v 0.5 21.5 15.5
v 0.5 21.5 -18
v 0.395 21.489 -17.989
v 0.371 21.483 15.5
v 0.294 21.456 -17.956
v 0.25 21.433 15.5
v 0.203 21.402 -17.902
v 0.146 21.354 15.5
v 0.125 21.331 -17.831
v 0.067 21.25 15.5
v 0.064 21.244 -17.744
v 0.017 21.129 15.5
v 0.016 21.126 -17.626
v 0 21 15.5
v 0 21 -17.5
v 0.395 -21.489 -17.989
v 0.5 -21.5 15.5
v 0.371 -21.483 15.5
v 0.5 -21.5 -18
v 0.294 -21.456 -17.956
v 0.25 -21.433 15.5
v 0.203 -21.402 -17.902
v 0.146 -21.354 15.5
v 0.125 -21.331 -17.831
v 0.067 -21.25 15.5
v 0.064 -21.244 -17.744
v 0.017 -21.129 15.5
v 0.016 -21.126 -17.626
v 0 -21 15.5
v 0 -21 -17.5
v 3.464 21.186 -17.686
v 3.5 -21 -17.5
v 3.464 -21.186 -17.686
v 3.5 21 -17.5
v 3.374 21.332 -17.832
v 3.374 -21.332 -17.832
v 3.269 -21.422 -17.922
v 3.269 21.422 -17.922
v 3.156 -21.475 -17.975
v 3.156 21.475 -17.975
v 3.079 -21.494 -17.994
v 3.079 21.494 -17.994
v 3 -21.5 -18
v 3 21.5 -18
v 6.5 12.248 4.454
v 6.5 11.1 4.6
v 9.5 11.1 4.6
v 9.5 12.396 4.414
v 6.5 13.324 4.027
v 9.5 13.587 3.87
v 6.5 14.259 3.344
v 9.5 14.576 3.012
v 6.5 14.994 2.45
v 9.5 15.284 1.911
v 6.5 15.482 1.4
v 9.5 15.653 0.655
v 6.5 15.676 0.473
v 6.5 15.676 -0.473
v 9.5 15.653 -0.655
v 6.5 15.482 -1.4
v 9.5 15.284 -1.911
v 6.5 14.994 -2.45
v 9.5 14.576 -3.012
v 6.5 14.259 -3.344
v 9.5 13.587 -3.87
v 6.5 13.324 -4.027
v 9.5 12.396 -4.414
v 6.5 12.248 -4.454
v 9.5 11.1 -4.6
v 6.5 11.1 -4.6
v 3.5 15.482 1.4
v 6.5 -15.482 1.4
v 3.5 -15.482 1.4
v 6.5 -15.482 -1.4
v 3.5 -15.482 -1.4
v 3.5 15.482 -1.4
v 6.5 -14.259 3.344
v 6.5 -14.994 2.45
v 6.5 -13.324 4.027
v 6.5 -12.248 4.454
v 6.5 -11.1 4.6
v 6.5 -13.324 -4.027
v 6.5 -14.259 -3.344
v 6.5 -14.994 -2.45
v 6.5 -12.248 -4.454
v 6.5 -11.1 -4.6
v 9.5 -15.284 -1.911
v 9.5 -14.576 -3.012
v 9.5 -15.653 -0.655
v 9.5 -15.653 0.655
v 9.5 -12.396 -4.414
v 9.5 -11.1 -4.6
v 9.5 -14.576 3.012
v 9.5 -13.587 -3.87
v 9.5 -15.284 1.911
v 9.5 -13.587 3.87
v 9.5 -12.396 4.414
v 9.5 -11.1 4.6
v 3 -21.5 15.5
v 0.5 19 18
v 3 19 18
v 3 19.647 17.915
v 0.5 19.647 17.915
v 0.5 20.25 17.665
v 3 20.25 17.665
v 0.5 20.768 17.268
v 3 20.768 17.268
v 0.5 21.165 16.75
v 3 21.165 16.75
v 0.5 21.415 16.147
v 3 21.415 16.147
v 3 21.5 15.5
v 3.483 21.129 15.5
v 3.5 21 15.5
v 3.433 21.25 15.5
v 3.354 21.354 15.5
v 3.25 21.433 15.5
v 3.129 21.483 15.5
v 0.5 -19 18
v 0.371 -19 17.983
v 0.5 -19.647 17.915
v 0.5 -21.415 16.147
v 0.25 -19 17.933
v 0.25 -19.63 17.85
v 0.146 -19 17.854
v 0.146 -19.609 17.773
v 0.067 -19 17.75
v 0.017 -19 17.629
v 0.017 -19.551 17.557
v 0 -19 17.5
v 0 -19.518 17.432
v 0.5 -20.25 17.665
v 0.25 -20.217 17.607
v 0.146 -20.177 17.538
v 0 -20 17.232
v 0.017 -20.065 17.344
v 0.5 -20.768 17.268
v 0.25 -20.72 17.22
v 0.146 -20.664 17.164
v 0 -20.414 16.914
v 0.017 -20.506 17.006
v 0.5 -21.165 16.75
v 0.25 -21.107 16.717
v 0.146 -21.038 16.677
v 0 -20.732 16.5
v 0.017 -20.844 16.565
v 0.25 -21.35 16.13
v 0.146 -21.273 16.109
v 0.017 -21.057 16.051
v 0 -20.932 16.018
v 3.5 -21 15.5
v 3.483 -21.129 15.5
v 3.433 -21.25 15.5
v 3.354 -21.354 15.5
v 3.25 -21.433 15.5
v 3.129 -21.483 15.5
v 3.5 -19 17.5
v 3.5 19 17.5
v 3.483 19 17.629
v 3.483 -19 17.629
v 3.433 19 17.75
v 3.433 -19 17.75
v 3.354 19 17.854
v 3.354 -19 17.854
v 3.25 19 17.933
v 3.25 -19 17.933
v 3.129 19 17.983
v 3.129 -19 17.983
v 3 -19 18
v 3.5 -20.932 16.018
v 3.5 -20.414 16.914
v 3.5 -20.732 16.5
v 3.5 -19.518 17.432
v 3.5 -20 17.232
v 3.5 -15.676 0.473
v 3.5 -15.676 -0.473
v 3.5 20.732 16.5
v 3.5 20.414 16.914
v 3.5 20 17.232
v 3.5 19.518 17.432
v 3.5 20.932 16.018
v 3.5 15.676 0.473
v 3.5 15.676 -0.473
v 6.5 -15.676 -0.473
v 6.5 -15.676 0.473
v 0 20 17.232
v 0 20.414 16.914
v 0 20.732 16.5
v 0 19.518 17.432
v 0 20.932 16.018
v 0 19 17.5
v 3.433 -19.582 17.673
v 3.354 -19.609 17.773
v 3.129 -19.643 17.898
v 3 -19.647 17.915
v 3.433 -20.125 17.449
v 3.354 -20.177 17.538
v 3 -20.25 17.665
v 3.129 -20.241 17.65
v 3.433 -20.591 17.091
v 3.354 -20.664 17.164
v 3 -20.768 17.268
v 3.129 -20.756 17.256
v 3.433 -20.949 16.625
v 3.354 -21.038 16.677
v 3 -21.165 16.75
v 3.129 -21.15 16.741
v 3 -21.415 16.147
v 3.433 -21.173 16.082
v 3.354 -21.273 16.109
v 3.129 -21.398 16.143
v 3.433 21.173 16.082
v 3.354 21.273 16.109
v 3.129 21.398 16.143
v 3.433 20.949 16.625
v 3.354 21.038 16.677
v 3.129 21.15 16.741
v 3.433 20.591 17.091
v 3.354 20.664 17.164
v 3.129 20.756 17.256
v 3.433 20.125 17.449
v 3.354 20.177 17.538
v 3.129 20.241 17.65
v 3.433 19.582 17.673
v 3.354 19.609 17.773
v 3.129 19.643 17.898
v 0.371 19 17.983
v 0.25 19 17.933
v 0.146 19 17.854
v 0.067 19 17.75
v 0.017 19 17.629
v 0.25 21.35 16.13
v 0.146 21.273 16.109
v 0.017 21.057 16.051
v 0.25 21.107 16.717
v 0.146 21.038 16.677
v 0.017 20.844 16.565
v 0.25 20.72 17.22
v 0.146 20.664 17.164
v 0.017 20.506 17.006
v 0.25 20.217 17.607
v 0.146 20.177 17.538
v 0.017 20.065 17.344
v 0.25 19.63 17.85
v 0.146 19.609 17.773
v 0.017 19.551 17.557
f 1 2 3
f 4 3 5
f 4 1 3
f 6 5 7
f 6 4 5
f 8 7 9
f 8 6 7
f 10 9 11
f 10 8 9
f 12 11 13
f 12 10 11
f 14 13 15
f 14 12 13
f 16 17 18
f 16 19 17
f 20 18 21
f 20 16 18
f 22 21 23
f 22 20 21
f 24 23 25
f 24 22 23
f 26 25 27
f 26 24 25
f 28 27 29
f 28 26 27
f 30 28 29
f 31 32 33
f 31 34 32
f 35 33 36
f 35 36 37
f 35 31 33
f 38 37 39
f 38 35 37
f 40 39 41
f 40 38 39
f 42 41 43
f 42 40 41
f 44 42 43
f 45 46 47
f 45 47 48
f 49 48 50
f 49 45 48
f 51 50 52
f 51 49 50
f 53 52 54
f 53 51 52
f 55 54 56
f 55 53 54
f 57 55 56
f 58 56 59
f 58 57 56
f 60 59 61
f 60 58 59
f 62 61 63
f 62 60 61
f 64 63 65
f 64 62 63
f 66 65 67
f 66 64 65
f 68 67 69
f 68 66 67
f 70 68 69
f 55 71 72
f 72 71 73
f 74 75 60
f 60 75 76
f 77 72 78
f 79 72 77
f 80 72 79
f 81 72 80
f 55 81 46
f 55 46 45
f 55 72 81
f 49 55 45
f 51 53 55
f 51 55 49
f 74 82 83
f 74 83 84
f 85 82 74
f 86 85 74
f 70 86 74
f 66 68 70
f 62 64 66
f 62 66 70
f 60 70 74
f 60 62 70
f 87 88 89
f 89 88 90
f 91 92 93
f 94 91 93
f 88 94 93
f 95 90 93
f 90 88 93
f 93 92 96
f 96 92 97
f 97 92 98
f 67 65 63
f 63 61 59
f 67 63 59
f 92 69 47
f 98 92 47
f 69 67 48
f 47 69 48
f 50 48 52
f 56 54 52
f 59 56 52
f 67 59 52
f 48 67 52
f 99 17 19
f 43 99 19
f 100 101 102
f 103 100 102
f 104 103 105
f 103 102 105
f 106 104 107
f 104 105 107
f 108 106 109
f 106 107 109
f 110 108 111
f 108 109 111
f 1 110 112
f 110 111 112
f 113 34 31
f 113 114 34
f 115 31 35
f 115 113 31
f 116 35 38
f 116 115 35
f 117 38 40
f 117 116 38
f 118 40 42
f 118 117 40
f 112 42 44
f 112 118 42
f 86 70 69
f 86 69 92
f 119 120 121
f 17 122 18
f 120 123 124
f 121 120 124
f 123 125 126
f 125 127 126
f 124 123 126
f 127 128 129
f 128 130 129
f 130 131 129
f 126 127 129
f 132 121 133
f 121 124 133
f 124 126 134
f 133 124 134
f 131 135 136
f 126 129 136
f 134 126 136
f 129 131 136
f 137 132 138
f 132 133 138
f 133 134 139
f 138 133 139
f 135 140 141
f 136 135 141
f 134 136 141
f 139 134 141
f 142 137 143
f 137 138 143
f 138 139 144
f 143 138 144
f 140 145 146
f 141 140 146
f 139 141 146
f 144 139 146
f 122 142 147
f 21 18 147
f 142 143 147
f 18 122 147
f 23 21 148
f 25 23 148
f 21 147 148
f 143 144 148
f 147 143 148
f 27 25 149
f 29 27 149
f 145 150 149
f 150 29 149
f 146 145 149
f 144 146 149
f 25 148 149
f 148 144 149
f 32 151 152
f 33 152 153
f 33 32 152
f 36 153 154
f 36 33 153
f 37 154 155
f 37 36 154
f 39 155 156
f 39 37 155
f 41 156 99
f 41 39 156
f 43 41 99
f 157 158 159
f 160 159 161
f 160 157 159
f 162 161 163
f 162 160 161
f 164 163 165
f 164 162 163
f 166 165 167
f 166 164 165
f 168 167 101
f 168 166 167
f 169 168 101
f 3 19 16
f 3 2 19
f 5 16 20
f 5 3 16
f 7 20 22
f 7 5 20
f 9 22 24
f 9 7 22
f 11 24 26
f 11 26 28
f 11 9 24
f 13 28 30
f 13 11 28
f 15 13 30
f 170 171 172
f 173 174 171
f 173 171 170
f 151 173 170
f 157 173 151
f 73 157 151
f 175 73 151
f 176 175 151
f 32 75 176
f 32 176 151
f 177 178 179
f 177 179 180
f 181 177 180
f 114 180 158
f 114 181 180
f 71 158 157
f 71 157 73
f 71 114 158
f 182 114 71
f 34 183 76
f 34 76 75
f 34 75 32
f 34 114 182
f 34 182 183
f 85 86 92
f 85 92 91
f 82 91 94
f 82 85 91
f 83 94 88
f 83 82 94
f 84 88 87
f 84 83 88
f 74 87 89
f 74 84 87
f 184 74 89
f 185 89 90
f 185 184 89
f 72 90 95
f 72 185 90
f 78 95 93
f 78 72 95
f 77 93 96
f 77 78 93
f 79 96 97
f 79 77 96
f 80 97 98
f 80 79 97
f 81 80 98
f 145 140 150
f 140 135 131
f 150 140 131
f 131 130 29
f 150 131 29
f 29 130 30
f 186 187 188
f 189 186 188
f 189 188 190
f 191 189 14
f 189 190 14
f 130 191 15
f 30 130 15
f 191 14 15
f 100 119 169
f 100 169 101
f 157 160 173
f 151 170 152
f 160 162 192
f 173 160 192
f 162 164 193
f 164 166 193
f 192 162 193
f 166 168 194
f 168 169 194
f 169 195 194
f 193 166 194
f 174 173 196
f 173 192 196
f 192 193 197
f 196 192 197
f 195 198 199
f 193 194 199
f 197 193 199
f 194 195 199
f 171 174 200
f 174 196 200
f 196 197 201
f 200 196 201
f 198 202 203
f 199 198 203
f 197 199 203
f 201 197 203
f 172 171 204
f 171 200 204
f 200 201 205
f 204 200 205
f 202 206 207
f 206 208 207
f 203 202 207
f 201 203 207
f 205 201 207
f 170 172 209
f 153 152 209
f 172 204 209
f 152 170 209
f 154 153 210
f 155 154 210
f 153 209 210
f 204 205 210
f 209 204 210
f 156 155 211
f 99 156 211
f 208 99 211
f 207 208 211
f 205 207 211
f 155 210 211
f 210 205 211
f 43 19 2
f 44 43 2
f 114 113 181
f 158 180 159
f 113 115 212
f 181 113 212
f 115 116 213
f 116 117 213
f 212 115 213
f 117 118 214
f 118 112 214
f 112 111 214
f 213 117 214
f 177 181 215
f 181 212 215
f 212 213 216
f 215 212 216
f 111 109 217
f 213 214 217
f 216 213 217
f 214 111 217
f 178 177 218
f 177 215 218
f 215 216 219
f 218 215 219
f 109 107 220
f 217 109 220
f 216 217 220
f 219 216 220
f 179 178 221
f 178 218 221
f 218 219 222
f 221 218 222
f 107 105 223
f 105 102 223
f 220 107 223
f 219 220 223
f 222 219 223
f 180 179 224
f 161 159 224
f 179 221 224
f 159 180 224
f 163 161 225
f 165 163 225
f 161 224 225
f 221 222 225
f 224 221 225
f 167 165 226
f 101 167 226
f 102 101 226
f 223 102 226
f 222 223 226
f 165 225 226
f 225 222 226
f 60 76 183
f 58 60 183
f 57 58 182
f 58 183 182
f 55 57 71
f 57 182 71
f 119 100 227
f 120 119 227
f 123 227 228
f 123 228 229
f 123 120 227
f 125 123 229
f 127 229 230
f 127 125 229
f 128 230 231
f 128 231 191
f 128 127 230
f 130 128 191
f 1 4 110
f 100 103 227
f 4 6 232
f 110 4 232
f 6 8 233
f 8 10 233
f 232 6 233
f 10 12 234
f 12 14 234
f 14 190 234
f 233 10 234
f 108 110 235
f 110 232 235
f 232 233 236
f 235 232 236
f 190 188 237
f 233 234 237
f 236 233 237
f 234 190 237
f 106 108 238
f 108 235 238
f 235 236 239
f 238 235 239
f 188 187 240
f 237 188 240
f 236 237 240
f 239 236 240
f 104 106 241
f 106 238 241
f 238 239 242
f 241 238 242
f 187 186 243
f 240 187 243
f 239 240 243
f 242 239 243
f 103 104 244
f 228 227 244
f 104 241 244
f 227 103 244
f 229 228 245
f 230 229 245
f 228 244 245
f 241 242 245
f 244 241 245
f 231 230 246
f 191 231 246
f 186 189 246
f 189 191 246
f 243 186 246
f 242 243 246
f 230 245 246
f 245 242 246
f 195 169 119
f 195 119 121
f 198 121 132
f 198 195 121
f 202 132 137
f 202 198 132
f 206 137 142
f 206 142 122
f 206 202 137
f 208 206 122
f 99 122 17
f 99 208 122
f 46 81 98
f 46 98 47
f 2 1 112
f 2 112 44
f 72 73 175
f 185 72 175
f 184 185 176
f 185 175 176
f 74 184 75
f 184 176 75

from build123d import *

# Parameters (mm, degrees)
SKICA1_W                = 36
SKICA1_H                = 43
P_IDAT_VYSUNUT_M1_DEPTH = 3.5
P_IDAT_VYSUNUT_M2_DEPTH = 3
P_IDAT_VYSUNUT_M3_DEPTH = 3
ZAOBLIT1_R              = 2.5
ZAOBLIT2_R              = 0.5


with BuildPart() as part:
    # Skica1 → Přidat vysunutím1 (new body)
    with BuildSketch(Plane(origin=(0, 0, 0), x_dir=(0, 0, -1), z_dir=(1, 0, 0))):
        Rectangle(SKICA1_W, SKICA1_H)
    extrude(amount=P_IDAT_VYSUNUT_M1_DEPTH)

    # Skica2 → Přidat vysunutím2 (add)
    with BuildSketch(Plane(origin=(3.5, 0, 0), x_dir=(0, 0, -1), z_dir=(1, 0, 0))):
        with BuildLine():
            Line((-1.4, 15.48178046), (-1.4, -15.48178046))
            ThreePointArc((-1.4, -15.48178046), (0, -15.7), (1.4, -15.48178046))
            Line((1.4, -15.48178046), (1.4, 15.48178046))
            ThreePointArc((1.4, 15.48178046), (0, 15.7), (-1.4, 15.48178046))
        make_face()
    extrude(amount=P_IDAT_VYSUNUT_M2_DEPTH)

    # Skica3 → Přidat vysunutím3 (add)
    with BuildSketch(Plane(origin=(6.5, 0, 0), x_dir=(0, 0, -1), z_dir=(1, 0, 0))):
        with BuildLine():
            Line((-4.6, -11.1), (-4.6, 11.1))
            ThreePointArc((-4.6, 11.1), (0, 15.7), (4.6, 11.1))
            Line((4.6, 11.1), (4.6, -11.1))
            ThreePointArc((4.6, -11.1), (0, -15.7), (-4.6, -11.1))
        make_face()
    extrude(amount=P_IDAT_VYSUNUT_M3_DEPTH)

    # Zaoblit1
    zaoblit1_edges = [part.edges().sort_by_distance(p)[0] for p in [
        (1.75, -21.5, 18),
        (1.75, 21.5, 18),
    ]]
    fillet(zaoblit1_edges, radius=ZAOBLIT1_R)

    # Zaoblit2
    zaoblit2_edges = [part.edges().sort_by_distance(p)[0] for p in [
        (3.5, 0, -18),
        (0, -21.5, -1.25),
        (3.5, -21.5, -1.25),
        (0, 0, 18),
        (0, 20.767766953, 17.267766953),
        (0, -20.767766953, 17.267766953),
        (3.5, 0, 18),
        (3.5, 20.767766953, 17.267766953),
        (3.5, -20.767766953, 17.267766953),
        (0, 21.5, -1.25),
        (0, 0, -18),
        (3.5, 21.5, -1.25),
    ]]
    fillet(zaoblit2_edges, radius=ZAOBLIT2_R)


solid = part.part
